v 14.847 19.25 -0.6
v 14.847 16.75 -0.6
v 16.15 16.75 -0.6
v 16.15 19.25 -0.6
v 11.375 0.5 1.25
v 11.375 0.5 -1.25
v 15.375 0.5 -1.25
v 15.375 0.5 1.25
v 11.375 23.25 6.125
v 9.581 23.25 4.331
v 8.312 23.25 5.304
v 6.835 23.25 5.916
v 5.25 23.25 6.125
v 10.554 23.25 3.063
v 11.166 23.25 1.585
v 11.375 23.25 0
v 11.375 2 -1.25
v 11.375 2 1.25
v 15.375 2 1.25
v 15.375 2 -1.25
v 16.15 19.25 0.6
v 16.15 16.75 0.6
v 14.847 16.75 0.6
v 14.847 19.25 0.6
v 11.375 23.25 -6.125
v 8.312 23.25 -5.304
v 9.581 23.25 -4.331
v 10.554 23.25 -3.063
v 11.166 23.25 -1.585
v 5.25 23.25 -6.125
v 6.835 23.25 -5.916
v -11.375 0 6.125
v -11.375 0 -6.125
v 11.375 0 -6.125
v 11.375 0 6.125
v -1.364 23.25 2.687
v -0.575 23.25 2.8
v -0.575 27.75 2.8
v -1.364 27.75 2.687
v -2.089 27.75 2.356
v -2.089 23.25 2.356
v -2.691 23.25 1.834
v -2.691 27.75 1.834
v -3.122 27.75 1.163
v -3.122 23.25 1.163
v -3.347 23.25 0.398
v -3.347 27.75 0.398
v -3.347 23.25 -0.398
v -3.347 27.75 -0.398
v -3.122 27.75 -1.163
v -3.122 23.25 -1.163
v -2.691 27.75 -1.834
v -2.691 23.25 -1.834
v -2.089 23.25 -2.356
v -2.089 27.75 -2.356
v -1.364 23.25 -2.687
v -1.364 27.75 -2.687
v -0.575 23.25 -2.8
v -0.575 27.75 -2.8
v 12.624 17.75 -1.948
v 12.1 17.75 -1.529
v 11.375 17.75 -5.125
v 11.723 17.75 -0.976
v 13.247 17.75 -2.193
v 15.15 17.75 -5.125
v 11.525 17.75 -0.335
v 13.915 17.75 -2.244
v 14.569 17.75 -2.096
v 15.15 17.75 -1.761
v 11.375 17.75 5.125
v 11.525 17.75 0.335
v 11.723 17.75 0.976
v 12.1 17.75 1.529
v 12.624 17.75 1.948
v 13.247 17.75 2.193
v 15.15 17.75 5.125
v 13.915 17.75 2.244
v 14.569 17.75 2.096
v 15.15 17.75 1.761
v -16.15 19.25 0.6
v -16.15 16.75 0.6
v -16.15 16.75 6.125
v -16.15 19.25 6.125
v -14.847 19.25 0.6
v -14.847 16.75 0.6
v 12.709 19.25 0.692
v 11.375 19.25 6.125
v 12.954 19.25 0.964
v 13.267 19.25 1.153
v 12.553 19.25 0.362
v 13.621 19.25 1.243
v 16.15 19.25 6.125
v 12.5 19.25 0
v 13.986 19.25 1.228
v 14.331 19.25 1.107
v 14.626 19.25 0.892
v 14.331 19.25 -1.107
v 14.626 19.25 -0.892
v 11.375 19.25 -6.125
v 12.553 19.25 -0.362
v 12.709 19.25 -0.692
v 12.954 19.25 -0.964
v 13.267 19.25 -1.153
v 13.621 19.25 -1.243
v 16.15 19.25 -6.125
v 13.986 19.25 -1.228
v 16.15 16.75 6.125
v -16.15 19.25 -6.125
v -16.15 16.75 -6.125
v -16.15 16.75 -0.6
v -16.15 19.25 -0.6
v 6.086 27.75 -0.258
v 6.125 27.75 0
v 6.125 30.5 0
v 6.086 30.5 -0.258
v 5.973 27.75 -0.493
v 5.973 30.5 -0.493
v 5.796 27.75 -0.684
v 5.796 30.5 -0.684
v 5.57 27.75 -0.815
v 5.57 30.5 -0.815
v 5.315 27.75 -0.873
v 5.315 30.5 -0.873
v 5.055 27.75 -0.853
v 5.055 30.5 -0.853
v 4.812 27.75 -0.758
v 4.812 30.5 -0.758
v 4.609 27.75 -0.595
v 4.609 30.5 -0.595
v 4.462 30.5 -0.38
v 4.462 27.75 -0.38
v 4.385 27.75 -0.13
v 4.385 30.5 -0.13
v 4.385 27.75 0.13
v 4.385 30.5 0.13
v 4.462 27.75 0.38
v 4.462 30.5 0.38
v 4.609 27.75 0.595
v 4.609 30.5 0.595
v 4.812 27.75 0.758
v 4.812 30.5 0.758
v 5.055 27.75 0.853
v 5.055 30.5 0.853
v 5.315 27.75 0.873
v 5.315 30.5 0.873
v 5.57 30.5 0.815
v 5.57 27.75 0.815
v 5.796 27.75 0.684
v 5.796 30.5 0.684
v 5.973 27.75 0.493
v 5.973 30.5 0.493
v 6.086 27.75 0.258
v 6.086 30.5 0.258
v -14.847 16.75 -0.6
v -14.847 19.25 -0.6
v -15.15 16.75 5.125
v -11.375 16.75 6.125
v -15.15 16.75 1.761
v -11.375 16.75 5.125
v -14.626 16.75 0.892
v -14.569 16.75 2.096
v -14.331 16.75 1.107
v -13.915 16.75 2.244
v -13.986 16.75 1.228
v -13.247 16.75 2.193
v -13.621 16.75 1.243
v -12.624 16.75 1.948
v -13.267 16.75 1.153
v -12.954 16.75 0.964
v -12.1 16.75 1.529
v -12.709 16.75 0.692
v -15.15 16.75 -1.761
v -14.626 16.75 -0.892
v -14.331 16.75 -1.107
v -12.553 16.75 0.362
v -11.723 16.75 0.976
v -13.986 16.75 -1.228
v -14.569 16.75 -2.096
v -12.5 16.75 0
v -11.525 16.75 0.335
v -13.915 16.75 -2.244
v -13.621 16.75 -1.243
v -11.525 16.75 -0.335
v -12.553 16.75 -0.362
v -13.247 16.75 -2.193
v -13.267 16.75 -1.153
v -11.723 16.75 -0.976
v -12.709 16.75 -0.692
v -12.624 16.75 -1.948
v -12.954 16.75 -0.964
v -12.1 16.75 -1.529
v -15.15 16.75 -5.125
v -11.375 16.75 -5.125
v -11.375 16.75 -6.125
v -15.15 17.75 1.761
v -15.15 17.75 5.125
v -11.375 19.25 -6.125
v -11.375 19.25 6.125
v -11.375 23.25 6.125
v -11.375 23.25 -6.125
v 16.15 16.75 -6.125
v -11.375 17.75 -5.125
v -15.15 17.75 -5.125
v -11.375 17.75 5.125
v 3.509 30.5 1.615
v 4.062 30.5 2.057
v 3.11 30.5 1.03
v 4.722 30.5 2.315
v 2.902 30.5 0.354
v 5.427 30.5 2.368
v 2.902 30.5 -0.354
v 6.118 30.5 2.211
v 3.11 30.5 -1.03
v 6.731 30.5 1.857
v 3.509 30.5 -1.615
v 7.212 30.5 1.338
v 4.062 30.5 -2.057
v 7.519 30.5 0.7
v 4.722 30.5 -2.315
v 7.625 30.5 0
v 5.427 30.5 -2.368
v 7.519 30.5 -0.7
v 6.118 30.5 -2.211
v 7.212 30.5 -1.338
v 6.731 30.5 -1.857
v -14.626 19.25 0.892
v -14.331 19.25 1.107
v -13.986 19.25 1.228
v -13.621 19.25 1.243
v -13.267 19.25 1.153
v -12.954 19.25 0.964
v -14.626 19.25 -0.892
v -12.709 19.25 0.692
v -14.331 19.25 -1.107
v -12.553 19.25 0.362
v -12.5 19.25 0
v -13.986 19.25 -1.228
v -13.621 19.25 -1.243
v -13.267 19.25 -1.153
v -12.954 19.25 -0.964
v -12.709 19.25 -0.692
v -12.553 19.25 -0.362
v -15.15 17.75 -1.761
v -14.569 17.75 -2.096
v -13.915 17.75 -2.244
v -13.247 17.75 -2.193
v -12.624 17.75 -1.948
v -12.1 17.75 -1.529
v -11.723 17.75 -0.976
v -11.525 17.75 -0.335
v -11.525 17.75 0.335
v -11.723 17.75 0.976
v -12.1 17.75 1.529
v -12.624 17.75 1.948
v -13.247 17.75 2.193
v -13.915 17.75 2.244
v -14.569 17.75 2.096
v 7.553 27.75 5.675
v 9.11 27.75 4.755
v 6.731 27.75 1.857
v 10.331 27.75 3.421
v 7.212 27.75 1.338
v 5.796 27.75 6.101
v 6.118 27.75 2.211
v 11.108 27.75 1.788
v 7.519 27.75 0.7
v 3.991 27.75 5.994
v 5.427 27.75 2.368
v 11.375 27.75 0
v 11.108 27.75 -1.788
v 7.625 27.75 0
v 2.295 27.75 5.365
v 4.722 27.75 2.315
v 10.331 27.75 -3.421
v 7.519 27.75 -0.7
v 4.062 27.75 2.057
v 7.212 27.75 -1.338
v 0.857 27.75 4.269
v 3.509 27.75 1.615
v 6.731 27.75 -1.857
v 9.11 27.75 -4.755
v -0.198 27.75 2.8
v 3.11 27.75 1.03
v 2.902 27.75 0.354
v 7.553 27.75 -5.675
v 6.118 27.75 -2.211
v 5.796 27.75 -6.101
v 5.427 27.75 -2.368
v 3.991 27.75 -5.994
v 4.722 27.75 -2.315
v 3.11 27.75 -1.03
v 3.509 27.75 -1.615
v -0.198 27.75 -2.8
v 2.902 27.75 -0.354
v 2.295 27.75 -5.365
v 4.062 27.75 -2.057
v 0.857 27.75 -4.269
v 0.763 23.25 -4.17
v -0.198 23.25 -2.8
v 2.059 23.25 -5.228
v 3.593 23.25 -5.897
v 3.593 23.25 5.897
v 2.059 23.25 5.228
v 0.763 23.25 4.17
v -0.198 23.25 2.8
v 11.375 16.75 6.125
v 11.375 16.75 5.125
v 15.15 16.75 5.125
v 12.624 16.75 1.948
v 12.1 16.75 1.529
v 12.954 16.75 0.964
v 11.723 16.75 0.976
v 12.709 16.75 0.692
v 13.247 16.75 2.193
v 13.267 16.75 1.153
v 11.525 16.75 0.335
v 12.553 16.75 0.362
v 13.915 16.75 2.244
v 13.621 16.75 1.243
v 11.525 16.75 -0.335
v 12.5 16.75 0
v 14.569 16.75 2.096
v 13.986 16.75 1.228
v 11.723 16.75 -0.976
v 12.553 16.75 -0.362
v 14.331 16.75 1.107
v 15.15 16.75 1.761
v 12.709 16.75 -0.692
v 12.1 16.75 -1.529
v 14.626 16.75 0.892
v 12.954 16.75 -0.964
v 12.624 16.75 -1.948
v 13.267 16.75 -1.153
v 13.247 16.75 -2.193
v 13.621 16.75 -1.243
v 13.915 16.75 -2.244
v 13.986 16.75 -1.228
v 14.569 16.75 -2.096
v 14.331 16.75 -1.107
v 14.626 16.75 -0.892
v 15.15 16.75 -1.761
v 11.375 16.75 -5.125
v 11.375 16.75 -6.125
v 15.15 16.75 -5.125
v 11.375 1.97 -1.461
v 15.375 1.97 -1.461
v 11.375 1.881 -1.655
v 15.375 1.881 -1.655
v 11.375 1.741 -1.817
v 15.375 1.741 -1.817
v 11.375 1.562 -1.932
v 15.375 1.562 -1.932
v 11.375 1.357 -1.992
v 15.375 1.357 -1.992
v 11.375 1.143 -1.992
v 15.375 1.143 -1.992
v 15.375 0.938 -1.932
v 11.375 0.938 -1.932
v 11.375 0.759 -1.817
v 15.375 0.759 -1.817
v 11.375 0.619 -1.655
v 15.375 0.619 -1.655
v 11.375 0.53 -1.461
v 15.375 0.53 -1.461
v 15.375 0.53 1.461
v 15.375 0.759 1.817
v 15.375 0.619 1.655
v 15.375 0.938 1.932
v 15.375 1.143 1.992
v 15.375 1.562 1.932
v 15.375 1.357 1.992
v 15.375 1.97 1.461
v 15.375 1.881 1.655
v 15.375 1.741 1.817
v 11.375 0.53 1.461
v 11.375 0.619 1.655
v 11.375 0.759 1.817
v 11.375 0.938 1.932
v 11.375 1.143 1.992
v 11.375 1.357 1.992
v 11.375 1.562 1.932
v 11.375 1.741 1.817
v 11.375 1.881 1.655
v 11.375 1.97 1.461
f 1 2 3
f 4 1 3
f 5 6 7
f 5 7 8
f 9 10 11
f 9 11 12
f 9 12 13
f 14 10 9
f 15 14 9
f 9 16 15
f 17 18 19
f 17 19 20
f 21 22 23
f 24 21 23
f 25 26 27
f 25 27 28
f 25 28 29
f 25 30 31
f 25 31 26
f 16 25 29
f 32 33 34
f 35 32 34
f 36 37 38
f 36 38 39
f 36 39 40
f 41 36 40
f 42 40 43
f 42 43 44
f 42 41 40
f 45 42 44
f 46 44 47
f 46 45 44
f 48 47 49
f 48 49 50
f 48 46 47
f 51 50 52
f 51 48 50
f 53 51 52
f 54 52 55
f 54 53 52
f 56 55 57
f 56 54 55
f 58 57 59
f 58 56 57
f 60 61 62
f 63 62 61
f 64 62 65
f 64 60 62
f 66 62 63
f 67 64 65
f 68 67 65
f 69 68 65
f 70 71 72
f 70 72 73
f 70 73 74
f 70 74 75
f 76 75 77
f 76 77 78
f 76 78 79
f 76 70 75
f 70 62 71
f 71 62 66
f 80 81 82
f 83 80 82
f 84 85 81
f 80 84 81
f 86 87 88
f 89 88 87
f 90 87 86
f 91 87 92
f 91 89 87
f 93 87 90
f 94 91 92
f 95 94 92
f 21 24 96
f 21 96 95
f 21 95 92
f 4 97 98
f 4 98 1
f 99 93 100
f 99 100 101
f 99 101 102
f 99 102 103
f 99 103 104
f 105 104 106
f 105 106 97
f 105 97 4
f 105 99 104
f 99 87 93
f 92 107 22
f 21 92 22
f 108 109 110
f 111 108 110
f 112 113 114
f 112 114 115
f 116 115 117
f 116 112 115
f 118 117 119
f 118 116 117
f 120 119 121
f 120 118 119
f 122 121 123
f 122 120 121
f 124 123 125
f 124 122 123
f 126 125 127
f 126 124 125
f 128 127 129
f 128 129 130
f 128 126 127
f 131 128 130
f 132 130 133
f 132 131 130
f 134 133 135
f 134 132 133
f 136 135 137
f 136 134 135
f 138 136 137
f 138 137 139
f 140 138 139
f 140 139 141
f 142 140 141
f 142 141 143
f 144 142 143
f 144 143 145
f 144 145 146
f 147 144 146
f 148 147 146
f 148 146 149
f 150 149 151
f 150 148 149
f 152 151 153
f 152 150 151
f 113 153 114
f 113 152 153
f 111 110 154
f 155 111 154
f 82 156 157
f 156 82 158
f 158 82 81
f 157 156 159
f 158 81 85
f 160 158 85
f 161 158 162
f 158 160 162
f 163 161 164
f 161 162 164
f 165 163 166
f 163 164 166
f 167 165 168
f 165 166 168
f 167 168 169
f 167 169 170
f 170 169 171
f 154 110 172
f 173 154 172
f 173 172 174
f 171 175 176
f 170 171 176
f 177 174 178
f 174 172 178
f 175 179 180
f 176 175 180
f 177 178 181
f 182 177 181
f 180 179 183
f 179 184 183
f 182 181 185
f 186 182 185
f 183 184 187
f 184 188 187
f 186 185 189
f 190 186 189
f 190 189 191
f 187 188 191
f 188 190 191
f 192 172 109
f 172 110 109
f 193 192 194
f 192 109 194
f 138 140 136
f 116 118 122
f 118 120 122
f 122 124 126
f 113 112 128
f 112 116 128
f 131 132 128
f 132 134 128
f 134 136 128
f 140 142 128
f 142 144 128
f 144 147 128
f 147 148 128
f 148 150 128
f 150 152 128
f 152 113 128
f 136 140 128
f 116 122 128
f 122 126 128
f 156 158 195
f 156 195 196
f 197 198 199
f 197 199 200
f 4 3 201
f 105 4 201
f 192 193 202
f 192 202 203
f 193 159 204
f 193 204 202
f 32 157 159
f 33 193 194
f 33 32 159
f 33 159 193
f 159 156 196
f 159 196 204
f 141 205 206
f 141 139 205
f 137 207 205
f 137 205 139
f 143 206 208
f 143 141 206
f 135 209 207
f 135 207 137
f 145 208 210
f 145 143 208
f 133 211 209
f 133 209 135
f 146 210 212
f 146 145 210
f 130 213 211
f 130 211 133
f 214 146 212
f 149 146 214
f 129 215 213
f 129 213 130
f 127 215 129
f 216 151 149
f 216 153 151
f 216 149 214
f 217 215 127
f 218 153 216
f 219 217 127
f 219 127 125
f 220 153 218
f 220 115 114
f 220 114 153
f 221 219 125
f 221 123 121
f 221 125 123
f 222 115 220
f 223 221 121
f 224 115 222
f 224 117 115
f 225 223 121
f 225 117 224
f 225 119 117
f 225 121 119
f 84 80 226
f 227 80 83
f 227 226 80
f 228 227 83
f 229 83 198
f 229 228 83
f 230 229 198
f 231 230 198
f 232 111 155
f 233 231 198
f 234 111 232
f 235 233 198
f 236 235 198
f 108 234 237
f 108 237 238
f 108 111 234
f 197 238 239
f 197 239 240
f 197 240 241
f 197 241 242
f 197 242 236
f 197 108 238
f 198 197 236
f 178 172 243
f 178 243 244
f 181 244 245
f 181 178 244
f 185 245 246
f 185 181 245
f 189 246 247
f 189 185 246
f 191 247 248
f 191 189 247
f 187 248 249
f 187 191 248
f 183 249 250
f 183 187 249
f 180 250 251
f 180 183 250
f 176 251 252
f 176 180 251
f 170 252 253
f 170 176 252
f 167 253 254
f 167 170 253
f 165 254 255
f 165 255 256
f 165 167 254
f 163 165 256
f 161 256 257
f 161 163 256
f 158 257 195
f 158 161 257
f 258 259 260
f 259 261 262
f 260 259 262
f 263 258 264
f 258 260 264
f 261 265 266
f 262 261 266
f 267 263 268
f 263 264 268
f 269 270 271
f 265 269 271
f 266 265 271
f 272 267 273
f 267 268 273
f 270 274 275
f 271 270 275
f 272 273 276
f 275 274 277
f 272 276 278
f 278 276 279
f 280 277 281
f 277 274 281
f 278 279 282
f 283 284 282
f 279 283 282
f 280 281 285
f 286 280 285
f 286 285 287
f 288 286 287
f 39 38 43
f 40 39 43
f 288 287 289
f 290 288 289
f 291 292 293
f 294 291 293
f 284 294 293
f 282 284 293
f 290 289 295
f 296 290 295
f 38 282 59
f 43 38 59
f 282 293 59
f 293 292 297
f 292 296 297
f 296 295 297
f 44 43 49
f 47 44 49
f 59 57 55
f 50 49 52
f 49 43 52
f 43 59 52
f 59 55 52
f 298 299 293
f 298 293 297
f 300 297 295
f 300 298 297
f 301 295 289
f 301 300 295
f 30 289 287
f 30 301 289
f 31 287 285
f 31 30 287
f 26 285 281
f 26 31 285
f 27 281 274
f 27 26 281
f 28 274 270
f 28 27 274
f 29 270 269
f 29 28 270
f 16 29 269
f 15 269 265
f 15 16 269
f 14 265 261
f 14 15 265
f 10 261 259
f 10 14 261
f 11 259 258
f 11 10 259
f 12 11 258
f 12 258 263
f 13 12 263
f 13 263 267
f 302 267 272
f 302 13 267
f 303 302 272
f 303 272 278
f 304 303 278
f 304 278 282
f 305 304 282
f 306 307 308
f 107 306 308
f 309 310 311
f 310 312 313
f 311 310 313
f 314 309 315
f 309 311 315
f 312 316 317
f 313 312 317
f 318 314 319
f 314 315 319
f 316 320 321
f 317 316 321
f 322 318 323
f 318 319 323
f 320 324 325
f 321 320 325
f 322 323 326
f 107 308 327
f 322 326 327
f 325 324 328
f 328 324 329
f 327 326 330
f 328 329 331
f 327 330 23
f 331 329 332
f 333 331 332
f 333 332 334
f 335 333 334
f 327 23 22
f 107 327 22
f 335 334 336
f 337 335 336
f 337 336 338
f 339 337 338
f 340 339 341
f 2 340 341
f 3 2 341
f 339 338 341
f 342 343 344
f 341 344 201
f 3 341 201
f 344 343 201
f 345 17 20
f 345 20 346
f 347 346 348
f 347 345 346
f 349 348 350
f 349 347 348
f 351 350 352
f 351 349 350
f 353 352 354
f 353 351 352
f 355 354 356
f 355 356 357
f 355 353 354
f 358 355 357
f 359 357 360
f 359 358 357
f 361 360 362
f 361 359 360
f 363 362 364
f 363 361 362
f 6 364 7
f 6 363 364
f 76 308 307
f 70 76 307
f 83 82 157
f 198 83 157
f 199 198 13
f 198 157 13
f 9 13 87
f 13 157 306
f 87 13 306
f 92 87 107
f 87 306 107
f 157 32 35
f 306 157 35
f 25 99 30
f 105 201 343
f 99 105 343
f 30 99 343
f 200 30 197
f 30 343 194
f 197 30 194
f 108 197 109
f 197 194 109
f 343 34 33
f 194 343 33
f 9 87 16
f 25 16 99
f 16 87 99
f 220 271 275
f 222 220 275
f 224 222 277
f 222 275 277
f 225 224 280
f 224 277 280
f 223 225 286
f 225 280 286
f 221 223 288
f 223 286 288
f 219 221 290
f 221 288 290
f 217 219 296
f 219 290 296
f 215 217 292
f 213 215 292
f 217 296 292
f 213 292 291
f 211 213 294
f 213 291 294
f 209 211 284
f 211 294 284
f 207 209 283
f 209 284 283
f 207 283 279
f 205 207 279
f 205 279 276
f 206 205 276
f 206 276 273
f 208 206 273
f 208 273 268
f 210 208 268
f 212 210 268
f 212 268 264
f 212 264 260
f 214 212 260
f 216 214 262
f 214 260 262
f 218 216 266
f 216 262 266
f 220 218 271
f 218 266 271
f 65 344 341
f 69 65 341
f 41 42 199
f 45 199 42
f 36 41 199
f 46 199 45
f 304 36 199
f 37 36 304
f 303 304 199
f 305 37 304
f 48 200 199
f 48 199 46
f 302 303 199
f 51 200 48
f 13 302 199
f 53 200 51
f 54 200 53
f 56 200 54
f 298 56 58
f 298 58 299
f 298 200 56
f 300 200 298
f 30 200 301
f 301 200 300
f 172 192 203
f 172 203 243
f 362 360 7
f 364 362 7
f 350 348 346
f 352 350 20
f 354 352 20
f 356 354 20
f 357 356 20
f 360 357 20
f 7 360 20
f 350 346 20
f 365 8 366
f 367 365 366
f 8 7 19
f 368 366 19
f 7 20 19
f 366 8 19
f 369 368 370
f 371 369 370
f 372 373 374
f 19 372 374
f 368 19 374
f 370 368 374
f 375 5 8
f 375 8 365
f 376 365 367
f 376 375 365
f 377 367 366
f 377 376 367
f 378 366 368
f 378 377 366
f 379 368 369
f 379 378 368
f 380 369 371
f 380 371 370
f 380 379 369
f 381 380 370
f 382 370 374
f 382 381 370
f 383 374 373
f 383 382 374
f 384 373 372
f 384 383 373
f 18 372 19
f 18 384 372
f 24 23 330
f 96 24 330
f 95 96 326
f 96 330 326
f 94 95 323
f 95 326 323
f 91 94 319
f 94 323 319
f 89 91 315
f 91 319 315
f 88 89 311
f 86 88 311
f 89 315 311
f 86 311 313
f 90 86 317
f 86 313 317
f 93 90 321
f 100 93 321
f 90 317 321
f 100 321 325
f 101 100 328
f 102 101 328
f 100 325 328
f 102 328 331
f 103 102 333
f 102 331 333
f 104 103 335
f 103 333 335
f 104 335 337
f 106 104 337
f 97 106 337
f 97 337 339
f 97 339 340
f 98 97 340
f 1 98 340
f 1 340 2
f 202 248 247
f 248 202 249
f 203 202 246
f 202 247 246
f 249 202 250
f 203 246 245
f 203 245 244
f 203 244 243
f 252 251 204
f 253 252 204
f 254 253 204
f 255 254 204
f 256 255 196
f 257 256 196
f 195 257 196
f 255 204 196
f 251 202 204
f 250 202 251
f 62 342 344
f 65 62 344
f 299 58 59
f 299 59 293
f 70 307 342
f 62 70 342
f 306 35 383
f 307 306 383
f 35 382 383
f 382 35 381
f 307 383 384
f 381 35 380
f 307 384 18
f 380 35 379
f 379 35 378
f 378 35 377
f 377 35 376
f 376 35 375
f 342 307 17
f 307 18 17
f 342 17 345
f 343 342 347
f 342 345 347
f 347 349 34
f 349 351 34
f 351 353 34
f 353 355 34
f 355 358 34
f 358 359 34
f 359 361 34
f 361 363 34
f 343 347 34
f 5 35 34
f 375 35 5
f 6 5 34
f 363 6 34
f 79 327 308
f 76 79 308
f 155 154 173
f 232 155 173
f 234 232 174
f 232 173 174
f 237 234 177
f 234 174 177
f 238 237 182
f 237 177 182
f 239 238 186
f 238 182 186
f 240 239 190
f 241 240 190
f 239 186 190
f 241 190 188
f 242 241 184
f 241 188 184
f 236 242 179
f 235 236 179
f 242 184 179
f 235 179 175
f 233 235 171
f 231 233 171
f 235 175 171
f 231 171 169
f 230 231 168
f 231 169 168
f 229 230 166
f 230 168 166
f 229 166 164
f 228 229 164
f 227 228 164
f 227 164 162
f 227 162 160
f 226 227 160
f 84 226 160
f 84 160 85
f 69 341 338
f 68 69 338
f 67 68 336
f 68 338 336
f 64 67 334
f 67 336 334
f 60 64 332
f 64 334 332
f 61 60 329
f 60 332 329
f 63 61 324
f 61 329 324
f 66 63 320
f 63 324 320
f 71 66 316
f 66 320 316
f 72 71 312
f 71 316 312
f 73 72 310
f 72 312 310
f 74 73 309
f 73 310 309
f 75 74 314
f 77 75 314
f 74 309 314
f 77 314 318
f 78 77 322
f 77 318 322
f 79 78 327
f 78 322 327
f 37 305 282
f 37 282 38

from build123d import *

# Parameters (mm, degrees)
SKETCH1_W           = 22.75
SKETCH1_H           = 12.25
BOSS_EXTRUDE1_DEPTH = 16.75
BOSS_EXTRUDE2_DEPTH = 2.5
CUT_EXTRUDE1_DEPTH  = 1
SKETCH5_W           = 22.75
SKETCH5_H           = 12.25
BOSS_EXTRUDE3_DEPTH = 4
BOSS_EXTRUDE4_DEPTH = 4.5
SKETCH7_R           = 2.375
SKETCH7_R_2         = 0.875
BOSS_EXTRUDE5_DEPTH = 2.75
BOSS_EXTRUDE6_DEPTH = 4


with BuildPart() as part:
    # Sketch1 → Boss-Extrude1 (new body)
    with BuildSketch(Plane(origin=(0, 0, 0), x_dir=(1, 0, 0), z_dir=(0, 1, 0))):
        Rectangle(SKETCH1_W, SKETCH1_H)
    extrude(amount=BOSS_EXTRUDE1_DEPTH)

    # Sketch3 → Boss-Extrude2 (add)
    with BuildSketch(Plane(origin=(0, 16.75, 0), x_dir=(1, 0, 0), z_dir=(0, 1, 0))):
        with BuildLine():
            Line((-16.15, -6.125), (16.15, -6.125))
            Line((16.15, -6.125), (16.15, -0.6))
            Line((16.15, -0.6), (14.84658561, -0.6))
            ThreePointArc((14.84658561, -0.6), (12.5, 0), (14.84658561, 0.6))
            Line((14.84658561, 0.6), (16.15, 0.6))
            Line((16.15, 0.6), (16.15, 6.125))
            Line((16.15, 6.125), (-16.15, 6.125))
            Line((-16.15, 6.125), (-16.15, 0.6))
            Line((-16.15, 0.6), (-14.84658561, 0.6))
            ThreePointArc((-14.84658561, 0.6), (-12.5, 0), (-14.84658561, -0.6))
            Line((-14.84658561, -0.6), (-16.15, -0.6))
            Line((-16.15, -0.6), (-16.15, -6.125))
        make_face()
    extrude(amount=BOSS_EXTRUDE2_DEPTH)

    # Sketch4 → Cut-Extrude1 (cut)
    with BuildSketch(Plane.XZ.offset(-16.75)):
        with BuildLine():
            Line((-11.375, -5.125), (-15.15, -5.125))
            Line((-15.15, -5.125), (-15.15, -1.761391495))
            ThreePointArc((-15.15, -1.761391495), (-11.5, 0), (-15.15, 1.761391495))
            Line((-15.15, 1.761391495), (-15.15, 5.125))
            Line((-15.15, 5.125), (-11.375, 5.125))
            Line((-11.375, 5.125), (-11.375, -5.125))
        make_face()
        with BuildLine():
            Line((11.375, 5.125), (11.375, -5.125))
            Line((11.375, -5.125), (15.15, -5.125))
            Line((15.15, -5.125), (15.15, -1.761391495))
            ThreePointArc((15.15, -1.761391495), (11.5, 0), (15.15, 1.761391495))
            Line((15.15, 1.761391495), (15.15, 5.125))
            Line((15.15, 5.125), (11.375, 5.125))
        make_face()
    extrude(amount=-CUT_EXTRUDE1_DEPTH, mode=Mode.SUBTRACT)

    # Sketch5 → Boss-Extrude3 (add)
    with BuildSketch(Plane(origin=(0, 19.25, 0), x_dir=(1, 0, 0), z_dir=(0, 1, 0))):
        Rectangle(SKETCH5_W, SKETCH5_H)
    extrude(amount=BOSS_EXTRUDE3_DEPTH)

    # Sketch6 → Boss-Extrude4 (add)
    with BuildSketch(Plane(origin=(0, 23.25, 0), x_dir=(1, 0, 0), z_dir=(0, 1, 0))):
        with BuildLine():
            Line((-0.575, 2.8), (-0.197533846, 2.8))
            ThreePointArc((-0.197533846, 2.8), (11.375, 0), (-0.197533846, -2.8))
            Line((-0.197533846, -2.8), (-0.575, -2.8))
            ThreePointArc((-0.575, -2.8), (-3.375, 0), (-0.575, 2.8))
        make_face()
    extrude(amount=BOSS_EXTRUDE4_DEPTH)

    # Sketch7 → Boss-Extrude5 (add)
    with BuildSketch(Plane(origin=(0, 27.75, 0), x_dir=(1, 0, 0), z_dir=(0, 1, 0))):
        with Locations((5.25, 0)):
            Circle(SKETCH7_R)
        with Locations((5.25, 0)):
            Circle(SKETCH7_R_2, mode=Mode.SUBTRACT)
    extrude(amount=BOSS_EXTRUDE5_DEPTH)

    # Sketch8 → Boss-Extrude6 (add)
    with BuildSketch(Plane(origin=(11.375, 0, 0), x_dir=(0, 0, -1), z_dir=(1, 0, 0))):
        with BuildLine():
            Line((-1.25, 2), (1.25, 2))
            ThreePointArc((1.25, 2), (2, 1.25), (1.25, 0.5))
            Line((1.25, 0.5), (-1.25, 0.5))
            ThreePointArc((-1.25, 0.5), (-2, 1.25), (-1.25, 2))
        make_face()
    extrude(amount=BOSS_EXTRUDE6_DEPTH)


solid = part.part
